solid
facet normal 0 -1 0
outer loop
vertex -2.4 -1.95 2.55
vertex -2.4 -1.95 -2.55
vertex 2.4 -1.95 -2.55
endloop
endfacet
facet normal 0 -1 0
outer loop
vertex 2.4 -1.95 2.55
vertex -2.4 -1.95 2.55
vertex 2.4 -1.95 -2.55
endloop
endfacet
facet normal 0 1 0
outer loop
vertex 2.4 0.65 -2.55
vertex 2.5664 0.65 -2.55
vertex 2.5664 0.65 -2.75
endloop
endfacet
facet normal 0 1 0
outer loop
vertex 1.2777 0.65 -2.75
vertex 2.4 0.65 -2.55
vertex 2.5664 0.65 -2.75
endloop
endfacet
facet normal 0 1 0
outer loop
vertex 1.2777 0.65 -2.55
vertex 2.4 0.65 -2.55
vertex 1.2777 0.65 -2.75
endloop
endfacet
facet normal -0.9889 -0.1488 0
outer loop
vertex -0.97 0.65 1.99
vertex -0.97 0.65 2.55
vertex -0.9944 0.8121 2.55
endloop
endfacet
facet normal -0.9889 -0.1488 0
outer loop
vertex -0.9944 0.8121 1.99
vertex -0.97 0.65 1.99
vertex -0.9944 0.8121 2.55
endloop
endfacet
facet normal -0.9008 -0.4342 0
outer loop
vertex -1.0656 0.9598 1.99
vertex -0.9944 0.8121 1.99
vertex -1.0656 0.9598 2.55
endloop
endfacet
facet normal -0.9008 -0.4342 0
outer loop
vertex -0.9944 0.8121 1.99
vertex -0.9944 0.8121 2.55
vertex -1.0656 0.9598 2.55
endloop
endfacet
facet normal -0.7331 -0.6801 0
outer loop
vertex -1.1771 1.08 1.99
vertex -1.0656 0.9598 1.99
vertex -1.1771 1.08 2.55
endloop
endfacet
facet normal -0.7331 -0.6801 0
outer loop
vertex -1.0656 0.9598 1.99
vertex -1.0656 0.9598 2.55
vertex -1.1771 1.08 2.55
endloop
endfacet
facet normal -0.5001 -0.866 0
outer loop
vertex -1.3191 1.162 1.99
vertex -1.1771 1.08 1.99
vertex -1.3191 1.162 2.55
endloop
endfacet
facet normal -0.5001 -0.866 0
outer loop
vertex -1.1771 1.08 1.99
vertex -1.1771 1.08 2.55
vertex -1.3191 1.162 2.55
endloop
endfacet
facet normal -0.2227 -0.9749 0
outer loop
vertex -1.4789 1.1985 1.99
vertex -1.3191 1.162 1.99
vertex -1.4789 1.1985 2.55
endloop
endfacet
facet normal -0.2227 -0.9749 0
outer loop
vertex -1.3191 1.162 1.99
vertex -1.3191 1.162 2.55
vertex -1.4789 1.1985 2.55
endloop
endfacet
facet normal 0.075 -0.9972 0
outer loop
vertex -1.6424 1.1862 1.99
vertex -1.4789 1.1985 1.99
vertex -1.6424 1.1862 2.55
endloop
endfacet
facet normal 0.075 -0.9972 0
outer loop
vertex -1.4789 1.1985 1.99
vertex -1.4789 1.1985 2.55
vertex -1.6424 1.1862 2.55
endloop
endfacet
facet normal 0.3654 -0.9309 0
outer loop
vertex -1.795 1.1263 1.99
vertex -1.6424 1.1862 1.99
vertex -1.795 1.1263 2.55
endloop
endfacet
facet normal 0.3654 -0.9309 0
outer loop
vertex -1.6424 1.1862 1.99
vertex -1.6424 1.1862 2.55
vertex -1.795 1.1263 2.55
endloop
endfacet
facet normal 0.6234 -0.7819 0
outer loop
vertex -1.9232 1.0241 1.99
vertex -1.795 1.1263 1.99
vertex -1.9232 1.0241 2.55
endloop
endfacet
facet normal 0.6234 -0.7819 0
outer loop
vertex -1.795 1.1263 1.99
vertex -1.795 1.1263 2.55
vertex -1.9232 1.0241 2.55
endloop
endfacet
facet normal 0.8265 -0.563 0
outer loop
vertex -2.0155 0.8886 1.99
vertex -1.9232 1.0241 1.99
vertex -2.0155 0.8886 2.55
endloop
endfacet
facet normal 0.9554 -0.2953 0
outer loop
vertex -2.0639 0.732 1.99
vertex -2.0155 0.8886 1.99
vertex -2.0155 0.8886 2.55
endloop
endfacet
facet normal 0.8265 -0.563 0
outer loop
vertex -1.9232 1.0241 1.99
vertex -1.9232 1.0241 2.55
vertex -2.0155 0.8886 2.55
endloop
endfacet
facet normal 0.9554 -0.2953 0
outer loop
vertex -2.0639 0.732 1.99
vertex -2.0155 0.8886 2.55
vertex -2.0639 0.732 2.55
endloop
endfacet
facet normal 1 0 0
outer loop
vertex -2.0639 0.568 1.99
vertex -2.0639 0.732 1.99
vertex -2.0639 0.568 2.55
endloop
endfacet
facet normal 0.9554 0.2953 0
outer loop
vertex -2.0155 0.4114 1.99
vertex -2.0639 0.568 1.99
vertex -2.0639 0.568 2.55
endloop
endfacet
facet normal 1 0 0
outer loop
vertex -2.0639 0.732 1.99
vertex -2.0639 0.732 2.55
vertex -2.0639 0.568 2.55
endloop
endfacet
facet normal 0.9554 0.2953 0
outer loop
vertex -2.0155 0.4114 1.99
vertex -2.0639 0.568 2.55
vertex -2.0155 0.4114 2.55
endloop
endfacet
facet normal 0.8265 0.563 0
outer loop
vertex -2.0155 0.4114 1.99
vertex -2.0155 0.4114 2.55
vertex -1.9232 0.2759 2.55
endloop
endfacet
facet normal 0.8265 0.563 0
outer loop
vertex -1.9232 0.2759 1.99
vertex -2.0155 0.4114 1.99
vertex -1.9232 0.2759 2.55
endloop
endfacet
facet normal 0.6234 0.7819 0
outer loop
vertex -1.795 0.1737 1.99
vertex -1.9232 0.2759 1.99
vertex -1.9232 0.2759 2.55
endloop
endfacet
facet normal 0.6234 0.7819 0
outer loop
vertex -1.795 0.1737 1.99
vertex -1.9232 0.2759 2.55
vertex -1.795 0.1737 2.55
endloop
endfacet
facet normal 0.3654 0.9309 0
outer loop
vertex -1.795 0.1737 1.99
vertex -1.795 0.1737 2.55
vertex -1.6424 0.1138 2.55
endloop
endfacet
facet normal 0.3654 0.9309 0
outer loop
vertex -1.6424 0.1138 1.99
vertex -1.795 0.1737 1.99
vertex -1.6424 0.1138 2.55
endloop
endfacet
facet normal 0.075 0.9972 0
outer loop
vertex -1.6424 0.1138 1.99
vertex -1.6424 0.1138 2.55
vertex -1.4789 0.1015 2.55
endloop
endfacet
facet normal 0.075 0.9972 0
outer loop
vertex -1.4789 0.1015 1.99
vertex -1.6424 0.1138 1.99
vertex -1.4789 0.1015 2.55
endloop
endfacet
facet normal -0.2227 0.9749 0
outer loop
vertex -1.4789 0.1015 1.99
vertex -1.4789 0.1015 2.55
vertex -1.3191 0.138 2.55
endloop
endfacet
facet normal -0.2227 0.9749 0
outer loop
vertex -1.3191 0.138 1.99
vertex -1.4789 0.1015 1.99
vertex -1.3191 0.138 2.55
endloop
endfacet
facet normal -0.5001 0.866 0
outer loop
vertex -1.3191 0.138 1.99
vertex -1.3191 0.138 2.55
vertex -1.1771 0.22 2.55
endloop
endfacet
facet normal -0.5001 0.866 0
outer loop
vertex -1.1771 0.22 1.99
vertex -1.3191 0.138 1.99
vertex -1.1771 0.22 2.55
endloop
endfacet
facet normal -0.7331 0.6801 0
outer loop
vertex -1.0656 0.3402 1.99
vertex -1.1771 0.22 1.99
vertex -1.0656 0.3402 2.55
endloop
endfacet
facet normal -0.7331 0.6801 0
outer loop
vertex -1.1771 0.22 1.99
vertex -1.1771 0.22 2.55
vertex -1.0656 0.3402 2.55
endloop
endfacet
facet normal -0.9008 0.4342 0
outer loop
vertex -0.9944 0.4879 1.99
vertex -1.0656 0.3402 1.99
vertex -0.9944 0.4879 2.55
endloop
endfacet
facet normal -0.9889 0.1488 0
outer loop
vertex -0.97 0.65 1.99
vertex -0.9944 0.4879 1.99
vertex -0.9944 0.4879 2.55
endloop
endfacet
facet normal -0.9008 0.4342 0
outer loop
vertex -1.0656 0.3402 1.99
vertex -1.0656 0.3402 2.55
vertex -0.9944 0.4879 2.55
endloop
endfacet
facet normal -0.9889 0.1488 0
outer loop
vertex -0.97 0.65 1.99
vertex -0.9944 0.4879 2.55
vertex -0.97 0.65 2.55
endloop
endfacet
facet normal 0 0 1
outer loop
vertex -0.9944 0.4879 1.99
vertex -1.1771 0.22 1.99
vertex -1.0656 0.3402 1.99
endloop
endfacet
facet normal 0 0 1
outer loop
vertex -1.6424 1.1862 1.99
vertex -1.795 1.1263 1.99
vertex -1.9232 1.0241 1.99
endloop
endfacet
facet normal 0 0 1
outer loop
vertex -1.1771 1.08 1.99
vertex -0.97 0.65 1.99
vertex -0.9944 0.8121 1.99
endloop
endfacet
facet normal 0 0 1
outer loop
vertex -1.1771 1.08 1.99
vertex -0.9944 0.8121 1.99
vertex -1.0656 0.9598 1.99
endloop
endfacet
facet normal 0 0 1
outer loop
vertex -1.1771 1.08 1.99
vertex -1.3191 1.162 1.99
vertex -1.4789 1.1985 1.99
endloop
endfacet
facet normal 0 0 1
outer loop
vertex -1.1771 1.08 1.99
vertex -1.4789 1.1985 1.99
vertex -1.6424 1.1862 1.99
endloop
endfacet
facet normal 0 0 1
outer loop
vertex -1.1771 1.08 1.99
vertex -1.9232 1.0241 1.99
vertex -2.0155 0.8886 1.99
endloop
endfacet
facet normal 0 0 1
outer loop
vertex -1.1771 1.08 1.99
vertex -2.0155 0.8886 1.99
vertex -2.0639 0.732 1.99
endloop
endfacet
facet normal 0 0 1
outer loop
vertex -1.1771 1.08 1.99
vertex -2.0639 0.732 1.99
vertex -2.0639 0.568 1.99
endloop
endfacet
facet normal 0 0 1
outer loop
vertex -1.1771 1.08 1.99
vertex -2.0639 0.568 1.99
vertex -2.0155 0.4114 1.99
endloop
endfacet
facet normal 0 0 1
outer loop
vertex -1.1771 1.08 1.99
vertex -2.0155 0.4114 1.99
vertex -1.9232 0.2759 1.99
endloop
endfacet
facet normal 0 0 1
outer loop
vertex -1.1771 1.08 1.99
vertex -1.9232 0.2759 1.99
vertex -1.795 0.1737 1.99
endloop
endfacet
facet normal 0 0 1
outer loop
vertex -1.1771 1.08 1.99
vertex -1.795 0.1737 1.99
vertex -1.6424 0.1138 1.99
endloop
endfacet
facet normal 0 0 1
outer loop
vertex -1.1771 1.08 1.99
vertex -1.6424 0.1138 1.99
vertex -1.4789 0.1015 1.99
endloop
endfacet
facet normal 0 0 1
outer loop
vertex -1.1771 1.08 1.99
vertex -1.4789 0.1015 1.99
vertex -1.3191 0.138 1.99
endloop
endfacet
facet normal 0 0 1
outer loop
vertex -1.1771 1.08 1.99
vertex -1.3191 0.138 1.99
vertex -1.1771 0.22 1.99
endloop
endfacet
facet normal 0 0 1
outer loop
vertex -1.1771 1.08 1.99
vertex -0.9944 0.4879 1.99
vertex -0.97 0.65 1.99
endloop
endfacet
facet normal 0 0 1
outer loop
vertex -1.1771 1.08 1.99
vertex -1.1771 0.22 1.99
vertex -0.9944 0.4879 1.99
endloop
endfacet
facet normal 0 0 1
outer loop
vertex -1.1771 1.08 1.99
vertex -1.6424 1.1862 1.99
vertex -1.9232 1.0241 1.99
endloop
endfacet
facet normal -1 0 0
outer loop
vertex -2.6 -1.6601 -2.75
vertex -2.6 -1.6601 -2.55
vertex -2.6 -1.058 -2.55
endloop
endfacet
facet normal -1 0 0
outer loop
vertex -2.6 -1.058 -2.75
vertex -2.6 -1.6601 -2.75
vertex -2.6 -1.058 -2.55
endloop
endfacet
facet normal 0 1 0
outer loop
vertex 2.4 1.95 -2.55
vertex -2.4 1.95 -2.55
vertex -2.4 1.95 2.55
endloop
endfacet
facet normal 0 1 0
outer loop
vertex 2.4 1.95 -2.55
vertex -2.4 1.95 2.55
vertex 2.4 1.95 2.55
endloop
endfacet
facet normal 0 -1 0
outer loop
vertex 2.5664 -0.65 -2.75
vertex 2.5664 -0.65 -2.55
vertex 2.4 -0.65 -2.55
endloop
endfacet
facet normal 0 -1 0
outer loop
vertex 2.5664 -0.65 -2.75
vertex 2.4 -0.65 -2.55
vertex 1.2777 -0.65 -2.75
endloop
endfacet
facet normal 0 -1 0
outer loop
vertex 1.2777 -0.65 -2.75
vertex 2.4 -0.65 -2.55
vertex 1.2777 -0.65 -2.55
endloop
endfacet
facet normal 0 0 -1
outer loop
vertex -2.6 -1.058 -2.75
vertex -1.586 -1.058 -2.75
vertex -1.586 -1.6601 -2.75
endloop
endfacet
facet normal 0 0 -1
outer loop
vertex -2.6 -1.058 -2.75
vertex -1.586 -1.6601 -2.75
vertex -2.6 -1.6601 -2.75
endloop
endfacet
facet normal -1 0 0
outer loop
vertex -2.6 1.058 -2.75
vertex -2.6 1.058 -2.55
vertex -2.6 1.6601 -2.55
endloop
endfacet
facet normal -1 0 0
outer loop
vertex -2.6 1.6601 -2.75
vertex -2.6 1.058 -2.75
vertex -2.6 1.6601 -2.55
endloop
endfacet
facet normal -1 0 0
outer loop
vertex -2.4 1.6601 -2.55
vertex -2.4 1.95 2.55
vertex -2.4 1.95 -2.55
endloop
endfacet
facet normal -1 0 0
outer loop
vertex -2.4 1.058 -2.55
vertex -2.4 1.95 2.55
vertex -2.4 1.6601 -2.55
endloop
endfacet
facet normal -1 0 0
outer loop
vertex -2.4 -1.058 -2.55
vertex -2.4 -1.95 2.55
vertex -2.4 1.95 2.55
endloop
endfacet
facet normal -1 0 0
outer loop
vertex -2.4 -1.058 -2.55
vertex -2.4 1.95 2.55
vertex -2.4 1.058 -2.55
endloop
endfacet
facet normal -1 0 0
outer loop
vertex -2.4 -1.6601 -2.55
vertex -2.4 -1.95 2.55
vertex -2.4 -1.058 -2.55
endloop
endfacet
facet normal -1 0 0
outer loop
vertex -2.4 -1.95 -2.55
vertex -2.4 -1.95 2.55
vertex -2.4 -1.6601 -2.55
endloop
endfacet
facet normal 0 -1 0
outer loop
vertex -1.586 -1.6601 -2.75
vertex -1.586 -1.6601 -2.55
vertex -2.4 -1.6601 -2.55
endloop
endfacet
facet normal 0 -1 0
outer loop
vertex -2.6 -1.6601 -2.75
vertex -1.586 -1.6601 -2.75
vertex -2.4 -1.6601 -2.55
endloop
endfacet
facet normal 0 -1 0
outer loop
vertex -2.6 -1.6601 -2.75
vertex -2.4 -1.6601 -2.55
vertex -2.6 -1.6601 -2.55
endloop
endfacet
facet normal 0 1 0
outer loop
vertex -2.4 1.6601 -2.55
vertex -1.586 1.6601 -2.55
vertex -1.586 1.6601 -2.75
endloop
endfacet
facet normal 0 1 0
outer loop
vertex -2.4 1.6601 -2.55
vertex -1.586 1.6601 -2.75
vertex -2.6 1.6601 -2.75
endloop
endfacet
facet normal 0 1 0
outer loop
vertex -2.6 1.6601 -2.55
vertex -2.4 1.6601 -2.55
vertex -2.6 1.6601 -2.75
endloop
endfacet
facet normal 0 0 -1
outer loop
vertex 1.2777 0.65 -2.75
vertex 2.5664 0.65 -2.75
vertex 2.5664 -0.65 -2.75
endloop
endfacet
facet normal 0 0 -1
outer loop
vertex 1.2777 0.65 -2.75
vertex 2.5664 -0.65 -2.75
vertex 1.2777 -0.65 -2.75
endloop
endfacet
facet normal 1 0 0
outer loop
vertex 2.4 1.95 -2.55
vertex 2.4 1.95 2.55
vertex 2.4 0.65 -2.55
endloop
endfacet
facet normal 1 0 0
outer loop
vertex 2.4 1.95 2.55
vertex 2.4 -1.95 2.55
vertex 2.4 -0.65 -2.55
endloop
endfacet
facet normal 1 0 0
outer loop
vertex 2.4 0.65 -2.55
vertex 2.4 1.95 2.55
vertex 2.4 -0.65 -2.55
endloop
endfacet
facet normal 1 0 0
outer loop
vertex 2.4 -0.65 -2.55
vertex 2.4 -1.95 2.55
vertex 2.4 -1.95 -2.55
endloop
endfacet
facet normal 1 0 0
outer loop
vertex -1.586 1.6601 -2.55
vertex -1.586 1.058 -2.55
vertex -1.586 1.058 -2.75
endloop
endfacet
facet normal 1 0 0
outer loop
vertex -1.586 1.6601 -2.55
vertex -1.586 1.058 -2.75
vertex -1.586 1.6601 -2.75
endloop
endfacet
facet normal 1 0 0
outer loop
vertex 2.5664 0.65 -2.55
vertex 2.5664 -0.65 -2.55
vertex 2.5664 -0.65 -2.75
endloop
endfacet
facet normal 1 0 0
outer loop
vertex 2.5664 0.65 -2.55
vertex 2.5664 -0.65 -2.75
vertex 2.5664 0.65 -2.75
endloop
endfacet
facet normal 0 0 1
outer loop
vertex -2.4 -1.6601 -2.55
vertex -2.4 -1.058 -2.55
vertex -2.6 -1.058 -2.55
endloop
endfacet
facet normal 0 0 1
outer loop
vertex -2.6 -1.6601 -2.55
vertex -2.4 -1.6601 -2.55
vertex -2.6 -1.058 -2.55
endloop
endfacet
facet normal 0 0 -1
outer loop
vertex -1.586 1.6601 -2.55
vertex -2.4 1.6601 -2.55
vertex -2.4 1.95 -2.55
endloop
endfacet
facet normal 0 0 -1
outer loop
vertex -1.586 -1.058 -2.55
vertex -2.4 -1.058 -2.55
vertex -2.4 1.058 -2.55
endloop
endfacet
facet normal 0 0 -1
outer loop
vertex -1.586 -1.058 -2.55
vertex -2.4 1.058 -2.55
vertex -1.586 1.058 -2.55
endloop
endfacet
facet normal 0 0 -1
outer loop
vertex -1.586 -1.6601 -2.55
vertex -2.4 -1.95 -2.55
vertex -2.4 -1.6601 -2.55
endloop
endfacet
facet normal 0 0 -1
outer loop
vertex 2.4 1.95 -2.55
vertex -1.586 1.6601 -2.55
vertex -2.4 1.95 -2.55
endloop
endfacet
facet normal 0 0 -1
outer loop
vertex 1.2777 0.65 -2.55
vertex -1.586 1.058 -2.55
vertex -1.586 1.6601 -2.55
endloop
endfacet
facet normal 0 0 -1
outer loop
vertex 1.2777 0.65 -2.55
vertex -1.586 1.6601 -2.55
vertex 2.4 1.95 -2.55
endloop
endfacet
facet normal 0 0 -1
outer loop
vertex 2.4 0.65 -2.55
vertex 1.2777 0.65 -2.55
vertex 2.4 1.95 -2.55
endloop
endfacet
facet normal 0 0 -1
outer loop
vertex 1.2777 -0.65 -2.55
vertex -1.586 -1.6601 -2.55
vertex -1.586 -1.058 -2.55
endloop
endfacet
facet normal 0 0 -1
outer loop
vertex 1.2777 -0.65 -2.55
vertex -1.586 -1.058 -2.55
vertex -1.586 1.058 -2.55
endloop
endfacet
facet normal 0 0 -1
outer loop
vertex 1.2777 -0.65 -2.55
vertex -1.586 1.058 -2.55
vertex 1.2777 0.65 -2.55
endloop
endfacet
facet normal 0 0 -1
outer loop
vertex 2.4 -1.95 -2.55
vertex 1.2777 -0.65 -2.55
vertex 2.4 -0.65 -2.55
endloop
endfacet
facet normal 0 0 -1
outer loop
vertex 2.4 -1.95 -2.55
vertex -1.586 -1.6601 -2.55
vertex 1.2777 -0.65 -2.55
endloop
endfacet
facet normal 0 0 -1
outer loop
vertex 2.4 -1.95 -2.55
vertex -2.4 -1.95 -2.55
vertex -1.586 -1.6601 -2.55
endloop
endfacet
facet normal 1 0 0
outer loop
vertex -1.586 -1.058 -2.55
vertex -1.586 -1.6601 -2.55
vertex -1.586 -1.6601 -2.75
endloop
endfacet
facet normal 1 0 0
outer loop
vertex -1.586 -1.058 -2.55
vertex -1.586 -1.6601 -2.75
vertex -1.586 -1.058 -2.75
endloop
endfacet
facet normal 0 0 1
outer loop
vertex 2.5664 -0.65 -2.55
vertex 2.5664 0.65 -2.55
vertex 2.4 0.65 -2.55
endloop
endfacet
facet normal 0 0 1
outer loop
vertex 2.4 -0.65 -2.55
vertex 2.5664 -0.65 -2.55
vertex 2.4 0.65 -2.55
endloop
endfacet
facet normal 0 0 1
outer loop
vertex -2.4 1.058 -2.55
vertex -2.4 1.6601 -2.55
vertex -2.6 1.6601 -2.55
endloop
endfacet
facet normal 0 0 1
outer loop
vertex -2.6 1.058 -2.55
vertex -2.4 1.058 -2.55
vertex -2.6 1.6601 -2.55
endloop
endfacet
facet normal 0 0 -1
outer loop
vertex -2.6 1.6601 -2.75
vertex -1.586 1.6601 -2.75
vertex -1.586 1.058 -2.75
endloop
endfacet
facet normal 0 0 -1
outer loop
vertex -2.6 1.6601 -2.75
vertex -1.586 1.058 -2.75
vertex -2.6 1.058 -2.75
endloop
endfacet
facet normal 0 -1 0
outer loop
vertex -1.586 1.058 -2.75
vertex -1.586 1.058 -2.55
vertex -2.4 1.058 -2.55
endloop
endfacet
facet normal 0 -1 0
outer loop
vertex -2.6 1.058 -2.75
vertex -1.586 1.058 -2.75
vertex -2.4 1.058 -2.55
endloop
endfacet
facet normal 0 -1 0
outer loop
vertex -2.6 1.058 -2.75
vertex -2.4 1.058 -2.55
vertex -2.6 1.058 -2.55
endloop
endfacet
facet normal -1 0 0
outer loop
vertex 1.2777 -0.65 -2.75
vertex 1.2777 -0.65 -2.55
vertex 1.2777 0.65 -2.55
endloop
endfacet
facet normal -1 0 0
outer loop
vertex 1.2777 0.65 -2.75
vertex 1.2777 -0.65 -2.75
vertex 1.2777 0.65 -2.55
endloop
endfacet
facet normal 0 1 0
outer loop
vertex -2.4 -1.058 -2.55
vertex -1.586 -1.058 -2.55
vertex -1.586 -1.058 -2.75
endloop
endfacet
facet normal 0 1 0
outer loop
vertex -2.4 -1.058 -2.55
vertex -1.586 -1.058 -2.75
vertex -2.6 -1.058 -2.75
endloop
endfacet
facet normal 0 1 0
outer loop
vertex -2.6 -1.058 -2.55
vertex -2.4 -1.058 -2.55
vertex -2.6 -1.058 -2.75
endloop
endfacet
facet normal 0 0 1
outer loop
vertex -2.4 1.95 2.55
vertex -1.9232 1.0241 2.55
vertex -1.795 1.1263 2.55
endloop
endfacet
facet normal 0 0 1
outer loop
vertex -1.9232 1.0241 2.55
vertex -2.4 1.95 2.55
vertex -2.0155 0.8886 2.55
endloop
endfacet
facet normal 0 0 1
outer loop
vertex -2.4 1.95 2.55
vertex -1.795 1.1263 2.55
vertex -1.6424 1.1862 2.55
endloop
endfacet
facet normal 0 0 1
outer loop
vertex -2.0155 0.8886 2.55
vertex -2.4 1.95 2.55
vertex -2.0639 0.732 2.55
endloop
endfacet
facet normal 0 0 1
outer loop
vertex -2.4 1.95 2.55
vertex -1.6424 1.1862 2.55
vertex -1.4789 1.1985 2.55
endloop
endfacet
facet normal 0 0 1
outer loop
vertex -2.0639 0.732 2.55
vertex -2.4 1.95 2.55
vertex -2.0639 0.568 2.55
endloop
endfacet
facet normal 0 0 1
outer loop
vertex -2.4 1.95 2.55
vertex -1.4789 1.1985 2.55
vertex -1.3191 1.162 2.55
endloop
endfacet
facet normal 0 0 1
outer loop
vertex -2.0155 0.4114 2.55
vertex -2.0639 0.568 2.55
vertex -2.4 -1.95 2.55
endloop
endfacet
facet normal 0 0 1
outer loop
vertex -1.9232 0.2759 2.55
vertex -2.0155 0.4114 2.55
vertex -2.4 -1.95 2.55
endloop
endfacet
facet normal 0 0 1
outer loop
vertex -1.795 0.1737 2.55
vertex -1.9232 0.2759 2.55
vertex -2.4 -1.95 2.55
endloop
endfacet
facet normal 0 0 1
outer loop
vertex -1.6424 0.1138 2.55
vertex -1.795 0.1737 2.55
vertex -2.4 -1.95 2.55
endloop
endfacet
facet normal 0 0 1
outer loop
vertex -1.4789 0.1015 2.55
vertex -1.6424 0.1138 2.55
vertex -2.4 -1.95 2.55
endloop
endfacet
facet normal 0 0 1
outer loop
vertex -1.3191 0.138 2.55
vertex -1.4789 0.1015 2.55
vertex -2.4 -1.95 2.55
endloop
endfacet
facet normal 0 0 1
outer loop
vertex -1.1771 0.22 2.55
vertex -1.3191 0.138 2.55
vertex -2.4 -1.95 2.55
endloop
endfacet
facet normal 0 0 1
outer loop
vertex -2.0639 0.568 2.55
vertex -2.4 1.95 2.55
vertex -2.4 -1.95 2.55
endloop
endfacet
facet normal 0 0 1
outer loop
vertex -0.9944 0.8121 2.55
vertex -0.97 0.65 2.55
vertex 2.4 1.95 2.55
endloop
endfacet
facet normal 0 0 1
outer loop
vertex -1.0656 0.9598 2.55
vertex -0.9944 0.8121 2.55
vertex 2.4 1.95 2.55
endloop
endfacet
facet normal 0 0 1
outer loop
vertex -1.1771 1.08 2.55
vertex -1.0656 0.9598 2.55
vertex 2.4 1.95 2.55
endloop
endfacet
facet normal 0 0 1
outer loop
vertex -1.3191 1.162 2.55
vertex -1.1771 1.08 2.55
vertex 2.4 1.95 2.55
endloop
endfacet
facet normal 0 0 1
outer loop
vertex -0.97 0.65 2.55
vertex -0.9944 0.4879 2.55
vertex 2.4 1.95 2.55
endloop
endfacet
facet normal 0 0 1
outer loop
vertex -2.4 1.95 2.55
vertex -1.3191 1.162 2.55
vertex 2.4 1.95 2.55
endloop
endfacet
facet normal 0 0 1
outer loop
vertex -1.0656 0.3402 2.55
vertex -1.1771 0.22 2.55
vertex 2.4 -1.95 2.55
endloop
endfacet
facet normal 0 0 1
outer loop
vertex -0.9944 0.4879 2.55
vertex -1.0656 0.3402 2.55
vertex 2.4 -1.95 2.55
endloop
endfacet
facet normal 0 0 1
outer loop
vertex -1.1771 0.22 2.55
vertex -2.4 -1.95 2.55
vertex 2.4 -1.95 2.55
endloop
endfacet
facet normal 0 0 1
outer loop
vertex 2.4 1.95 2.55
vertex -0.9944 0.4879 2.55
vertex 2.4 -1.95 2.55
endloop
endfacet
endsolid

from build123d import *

# Parameters (mm, degrees)
EXTRUDE_1_DEPTH      = 1.95
EXTRUDE_1_DEPTH_BACK = 1.95
SKETCH_1_W           = 4.8
SKETCH_1_H           = 5.1
SKETCH_4_R           = 0.55
CUT_EXTRUDE_1_DEPTH  = 0.56
SKETCH_5_W           = 1.288637745
SKETCH_5_H           = 1.3
SKETCH_5_W_2         = 1.014010029
SKETCH_5_H_2         = 0.602068455
EXTRUDE_1_2_DEPTH    = 0.2


with BuildPart() as part:
    # 草图1 → Extrude 1 (new, two sides: drawn at the far end of the back side and taken through both)
    with BuildSketch(Plane(origin=(0, 0, 0), x_dir=(1, 0, 0), z_dir=(0, 1, 0)).offset(-EXTRUDE_1_DEPTH_BACK)):
        Rectangle(SKETCH_1_W, SKETCH_1_H)
    extrude(amount=EXTRUDE_1_DEPTH + EXTRUDE_1_DEPTH_BACK)

    # 草图4 → 切除-拉伸1 (cut)
    with BuildSketch(Plane.XY.offset(2.55)):
        with Locations((-1.52, 0.65)):
            Circle(SKETCH_4_R)
    extrude(amount=-CUT_EXTRUDE_1_DEPTH, mode=Mode.SUBTRACT)

    # 草图5 → Extrude 1 2 (add)
    with BuildSketch(Plane(origin=(0, 0, -2.55), x_dir=(-1, 0, 0), z_dir=(0, 0, -1))):
        with Locations((-1.922058583, 0)):
            Rectangle(SKETCH_5_W, SKETCH_5_H)
        with Locations((2.092994985, 1.359060107)):
            Rectangle(SKETCH_5_W_2, SKETCH_5_H_2)
        with Locations((2.092994985, -1.359060107)):
            Rectangle(SKETCH_5_W_2, SKETCH_5_H_2)
    extrude(amount=EXTRUDE_1_2_DEPTH)


solid = part.part
